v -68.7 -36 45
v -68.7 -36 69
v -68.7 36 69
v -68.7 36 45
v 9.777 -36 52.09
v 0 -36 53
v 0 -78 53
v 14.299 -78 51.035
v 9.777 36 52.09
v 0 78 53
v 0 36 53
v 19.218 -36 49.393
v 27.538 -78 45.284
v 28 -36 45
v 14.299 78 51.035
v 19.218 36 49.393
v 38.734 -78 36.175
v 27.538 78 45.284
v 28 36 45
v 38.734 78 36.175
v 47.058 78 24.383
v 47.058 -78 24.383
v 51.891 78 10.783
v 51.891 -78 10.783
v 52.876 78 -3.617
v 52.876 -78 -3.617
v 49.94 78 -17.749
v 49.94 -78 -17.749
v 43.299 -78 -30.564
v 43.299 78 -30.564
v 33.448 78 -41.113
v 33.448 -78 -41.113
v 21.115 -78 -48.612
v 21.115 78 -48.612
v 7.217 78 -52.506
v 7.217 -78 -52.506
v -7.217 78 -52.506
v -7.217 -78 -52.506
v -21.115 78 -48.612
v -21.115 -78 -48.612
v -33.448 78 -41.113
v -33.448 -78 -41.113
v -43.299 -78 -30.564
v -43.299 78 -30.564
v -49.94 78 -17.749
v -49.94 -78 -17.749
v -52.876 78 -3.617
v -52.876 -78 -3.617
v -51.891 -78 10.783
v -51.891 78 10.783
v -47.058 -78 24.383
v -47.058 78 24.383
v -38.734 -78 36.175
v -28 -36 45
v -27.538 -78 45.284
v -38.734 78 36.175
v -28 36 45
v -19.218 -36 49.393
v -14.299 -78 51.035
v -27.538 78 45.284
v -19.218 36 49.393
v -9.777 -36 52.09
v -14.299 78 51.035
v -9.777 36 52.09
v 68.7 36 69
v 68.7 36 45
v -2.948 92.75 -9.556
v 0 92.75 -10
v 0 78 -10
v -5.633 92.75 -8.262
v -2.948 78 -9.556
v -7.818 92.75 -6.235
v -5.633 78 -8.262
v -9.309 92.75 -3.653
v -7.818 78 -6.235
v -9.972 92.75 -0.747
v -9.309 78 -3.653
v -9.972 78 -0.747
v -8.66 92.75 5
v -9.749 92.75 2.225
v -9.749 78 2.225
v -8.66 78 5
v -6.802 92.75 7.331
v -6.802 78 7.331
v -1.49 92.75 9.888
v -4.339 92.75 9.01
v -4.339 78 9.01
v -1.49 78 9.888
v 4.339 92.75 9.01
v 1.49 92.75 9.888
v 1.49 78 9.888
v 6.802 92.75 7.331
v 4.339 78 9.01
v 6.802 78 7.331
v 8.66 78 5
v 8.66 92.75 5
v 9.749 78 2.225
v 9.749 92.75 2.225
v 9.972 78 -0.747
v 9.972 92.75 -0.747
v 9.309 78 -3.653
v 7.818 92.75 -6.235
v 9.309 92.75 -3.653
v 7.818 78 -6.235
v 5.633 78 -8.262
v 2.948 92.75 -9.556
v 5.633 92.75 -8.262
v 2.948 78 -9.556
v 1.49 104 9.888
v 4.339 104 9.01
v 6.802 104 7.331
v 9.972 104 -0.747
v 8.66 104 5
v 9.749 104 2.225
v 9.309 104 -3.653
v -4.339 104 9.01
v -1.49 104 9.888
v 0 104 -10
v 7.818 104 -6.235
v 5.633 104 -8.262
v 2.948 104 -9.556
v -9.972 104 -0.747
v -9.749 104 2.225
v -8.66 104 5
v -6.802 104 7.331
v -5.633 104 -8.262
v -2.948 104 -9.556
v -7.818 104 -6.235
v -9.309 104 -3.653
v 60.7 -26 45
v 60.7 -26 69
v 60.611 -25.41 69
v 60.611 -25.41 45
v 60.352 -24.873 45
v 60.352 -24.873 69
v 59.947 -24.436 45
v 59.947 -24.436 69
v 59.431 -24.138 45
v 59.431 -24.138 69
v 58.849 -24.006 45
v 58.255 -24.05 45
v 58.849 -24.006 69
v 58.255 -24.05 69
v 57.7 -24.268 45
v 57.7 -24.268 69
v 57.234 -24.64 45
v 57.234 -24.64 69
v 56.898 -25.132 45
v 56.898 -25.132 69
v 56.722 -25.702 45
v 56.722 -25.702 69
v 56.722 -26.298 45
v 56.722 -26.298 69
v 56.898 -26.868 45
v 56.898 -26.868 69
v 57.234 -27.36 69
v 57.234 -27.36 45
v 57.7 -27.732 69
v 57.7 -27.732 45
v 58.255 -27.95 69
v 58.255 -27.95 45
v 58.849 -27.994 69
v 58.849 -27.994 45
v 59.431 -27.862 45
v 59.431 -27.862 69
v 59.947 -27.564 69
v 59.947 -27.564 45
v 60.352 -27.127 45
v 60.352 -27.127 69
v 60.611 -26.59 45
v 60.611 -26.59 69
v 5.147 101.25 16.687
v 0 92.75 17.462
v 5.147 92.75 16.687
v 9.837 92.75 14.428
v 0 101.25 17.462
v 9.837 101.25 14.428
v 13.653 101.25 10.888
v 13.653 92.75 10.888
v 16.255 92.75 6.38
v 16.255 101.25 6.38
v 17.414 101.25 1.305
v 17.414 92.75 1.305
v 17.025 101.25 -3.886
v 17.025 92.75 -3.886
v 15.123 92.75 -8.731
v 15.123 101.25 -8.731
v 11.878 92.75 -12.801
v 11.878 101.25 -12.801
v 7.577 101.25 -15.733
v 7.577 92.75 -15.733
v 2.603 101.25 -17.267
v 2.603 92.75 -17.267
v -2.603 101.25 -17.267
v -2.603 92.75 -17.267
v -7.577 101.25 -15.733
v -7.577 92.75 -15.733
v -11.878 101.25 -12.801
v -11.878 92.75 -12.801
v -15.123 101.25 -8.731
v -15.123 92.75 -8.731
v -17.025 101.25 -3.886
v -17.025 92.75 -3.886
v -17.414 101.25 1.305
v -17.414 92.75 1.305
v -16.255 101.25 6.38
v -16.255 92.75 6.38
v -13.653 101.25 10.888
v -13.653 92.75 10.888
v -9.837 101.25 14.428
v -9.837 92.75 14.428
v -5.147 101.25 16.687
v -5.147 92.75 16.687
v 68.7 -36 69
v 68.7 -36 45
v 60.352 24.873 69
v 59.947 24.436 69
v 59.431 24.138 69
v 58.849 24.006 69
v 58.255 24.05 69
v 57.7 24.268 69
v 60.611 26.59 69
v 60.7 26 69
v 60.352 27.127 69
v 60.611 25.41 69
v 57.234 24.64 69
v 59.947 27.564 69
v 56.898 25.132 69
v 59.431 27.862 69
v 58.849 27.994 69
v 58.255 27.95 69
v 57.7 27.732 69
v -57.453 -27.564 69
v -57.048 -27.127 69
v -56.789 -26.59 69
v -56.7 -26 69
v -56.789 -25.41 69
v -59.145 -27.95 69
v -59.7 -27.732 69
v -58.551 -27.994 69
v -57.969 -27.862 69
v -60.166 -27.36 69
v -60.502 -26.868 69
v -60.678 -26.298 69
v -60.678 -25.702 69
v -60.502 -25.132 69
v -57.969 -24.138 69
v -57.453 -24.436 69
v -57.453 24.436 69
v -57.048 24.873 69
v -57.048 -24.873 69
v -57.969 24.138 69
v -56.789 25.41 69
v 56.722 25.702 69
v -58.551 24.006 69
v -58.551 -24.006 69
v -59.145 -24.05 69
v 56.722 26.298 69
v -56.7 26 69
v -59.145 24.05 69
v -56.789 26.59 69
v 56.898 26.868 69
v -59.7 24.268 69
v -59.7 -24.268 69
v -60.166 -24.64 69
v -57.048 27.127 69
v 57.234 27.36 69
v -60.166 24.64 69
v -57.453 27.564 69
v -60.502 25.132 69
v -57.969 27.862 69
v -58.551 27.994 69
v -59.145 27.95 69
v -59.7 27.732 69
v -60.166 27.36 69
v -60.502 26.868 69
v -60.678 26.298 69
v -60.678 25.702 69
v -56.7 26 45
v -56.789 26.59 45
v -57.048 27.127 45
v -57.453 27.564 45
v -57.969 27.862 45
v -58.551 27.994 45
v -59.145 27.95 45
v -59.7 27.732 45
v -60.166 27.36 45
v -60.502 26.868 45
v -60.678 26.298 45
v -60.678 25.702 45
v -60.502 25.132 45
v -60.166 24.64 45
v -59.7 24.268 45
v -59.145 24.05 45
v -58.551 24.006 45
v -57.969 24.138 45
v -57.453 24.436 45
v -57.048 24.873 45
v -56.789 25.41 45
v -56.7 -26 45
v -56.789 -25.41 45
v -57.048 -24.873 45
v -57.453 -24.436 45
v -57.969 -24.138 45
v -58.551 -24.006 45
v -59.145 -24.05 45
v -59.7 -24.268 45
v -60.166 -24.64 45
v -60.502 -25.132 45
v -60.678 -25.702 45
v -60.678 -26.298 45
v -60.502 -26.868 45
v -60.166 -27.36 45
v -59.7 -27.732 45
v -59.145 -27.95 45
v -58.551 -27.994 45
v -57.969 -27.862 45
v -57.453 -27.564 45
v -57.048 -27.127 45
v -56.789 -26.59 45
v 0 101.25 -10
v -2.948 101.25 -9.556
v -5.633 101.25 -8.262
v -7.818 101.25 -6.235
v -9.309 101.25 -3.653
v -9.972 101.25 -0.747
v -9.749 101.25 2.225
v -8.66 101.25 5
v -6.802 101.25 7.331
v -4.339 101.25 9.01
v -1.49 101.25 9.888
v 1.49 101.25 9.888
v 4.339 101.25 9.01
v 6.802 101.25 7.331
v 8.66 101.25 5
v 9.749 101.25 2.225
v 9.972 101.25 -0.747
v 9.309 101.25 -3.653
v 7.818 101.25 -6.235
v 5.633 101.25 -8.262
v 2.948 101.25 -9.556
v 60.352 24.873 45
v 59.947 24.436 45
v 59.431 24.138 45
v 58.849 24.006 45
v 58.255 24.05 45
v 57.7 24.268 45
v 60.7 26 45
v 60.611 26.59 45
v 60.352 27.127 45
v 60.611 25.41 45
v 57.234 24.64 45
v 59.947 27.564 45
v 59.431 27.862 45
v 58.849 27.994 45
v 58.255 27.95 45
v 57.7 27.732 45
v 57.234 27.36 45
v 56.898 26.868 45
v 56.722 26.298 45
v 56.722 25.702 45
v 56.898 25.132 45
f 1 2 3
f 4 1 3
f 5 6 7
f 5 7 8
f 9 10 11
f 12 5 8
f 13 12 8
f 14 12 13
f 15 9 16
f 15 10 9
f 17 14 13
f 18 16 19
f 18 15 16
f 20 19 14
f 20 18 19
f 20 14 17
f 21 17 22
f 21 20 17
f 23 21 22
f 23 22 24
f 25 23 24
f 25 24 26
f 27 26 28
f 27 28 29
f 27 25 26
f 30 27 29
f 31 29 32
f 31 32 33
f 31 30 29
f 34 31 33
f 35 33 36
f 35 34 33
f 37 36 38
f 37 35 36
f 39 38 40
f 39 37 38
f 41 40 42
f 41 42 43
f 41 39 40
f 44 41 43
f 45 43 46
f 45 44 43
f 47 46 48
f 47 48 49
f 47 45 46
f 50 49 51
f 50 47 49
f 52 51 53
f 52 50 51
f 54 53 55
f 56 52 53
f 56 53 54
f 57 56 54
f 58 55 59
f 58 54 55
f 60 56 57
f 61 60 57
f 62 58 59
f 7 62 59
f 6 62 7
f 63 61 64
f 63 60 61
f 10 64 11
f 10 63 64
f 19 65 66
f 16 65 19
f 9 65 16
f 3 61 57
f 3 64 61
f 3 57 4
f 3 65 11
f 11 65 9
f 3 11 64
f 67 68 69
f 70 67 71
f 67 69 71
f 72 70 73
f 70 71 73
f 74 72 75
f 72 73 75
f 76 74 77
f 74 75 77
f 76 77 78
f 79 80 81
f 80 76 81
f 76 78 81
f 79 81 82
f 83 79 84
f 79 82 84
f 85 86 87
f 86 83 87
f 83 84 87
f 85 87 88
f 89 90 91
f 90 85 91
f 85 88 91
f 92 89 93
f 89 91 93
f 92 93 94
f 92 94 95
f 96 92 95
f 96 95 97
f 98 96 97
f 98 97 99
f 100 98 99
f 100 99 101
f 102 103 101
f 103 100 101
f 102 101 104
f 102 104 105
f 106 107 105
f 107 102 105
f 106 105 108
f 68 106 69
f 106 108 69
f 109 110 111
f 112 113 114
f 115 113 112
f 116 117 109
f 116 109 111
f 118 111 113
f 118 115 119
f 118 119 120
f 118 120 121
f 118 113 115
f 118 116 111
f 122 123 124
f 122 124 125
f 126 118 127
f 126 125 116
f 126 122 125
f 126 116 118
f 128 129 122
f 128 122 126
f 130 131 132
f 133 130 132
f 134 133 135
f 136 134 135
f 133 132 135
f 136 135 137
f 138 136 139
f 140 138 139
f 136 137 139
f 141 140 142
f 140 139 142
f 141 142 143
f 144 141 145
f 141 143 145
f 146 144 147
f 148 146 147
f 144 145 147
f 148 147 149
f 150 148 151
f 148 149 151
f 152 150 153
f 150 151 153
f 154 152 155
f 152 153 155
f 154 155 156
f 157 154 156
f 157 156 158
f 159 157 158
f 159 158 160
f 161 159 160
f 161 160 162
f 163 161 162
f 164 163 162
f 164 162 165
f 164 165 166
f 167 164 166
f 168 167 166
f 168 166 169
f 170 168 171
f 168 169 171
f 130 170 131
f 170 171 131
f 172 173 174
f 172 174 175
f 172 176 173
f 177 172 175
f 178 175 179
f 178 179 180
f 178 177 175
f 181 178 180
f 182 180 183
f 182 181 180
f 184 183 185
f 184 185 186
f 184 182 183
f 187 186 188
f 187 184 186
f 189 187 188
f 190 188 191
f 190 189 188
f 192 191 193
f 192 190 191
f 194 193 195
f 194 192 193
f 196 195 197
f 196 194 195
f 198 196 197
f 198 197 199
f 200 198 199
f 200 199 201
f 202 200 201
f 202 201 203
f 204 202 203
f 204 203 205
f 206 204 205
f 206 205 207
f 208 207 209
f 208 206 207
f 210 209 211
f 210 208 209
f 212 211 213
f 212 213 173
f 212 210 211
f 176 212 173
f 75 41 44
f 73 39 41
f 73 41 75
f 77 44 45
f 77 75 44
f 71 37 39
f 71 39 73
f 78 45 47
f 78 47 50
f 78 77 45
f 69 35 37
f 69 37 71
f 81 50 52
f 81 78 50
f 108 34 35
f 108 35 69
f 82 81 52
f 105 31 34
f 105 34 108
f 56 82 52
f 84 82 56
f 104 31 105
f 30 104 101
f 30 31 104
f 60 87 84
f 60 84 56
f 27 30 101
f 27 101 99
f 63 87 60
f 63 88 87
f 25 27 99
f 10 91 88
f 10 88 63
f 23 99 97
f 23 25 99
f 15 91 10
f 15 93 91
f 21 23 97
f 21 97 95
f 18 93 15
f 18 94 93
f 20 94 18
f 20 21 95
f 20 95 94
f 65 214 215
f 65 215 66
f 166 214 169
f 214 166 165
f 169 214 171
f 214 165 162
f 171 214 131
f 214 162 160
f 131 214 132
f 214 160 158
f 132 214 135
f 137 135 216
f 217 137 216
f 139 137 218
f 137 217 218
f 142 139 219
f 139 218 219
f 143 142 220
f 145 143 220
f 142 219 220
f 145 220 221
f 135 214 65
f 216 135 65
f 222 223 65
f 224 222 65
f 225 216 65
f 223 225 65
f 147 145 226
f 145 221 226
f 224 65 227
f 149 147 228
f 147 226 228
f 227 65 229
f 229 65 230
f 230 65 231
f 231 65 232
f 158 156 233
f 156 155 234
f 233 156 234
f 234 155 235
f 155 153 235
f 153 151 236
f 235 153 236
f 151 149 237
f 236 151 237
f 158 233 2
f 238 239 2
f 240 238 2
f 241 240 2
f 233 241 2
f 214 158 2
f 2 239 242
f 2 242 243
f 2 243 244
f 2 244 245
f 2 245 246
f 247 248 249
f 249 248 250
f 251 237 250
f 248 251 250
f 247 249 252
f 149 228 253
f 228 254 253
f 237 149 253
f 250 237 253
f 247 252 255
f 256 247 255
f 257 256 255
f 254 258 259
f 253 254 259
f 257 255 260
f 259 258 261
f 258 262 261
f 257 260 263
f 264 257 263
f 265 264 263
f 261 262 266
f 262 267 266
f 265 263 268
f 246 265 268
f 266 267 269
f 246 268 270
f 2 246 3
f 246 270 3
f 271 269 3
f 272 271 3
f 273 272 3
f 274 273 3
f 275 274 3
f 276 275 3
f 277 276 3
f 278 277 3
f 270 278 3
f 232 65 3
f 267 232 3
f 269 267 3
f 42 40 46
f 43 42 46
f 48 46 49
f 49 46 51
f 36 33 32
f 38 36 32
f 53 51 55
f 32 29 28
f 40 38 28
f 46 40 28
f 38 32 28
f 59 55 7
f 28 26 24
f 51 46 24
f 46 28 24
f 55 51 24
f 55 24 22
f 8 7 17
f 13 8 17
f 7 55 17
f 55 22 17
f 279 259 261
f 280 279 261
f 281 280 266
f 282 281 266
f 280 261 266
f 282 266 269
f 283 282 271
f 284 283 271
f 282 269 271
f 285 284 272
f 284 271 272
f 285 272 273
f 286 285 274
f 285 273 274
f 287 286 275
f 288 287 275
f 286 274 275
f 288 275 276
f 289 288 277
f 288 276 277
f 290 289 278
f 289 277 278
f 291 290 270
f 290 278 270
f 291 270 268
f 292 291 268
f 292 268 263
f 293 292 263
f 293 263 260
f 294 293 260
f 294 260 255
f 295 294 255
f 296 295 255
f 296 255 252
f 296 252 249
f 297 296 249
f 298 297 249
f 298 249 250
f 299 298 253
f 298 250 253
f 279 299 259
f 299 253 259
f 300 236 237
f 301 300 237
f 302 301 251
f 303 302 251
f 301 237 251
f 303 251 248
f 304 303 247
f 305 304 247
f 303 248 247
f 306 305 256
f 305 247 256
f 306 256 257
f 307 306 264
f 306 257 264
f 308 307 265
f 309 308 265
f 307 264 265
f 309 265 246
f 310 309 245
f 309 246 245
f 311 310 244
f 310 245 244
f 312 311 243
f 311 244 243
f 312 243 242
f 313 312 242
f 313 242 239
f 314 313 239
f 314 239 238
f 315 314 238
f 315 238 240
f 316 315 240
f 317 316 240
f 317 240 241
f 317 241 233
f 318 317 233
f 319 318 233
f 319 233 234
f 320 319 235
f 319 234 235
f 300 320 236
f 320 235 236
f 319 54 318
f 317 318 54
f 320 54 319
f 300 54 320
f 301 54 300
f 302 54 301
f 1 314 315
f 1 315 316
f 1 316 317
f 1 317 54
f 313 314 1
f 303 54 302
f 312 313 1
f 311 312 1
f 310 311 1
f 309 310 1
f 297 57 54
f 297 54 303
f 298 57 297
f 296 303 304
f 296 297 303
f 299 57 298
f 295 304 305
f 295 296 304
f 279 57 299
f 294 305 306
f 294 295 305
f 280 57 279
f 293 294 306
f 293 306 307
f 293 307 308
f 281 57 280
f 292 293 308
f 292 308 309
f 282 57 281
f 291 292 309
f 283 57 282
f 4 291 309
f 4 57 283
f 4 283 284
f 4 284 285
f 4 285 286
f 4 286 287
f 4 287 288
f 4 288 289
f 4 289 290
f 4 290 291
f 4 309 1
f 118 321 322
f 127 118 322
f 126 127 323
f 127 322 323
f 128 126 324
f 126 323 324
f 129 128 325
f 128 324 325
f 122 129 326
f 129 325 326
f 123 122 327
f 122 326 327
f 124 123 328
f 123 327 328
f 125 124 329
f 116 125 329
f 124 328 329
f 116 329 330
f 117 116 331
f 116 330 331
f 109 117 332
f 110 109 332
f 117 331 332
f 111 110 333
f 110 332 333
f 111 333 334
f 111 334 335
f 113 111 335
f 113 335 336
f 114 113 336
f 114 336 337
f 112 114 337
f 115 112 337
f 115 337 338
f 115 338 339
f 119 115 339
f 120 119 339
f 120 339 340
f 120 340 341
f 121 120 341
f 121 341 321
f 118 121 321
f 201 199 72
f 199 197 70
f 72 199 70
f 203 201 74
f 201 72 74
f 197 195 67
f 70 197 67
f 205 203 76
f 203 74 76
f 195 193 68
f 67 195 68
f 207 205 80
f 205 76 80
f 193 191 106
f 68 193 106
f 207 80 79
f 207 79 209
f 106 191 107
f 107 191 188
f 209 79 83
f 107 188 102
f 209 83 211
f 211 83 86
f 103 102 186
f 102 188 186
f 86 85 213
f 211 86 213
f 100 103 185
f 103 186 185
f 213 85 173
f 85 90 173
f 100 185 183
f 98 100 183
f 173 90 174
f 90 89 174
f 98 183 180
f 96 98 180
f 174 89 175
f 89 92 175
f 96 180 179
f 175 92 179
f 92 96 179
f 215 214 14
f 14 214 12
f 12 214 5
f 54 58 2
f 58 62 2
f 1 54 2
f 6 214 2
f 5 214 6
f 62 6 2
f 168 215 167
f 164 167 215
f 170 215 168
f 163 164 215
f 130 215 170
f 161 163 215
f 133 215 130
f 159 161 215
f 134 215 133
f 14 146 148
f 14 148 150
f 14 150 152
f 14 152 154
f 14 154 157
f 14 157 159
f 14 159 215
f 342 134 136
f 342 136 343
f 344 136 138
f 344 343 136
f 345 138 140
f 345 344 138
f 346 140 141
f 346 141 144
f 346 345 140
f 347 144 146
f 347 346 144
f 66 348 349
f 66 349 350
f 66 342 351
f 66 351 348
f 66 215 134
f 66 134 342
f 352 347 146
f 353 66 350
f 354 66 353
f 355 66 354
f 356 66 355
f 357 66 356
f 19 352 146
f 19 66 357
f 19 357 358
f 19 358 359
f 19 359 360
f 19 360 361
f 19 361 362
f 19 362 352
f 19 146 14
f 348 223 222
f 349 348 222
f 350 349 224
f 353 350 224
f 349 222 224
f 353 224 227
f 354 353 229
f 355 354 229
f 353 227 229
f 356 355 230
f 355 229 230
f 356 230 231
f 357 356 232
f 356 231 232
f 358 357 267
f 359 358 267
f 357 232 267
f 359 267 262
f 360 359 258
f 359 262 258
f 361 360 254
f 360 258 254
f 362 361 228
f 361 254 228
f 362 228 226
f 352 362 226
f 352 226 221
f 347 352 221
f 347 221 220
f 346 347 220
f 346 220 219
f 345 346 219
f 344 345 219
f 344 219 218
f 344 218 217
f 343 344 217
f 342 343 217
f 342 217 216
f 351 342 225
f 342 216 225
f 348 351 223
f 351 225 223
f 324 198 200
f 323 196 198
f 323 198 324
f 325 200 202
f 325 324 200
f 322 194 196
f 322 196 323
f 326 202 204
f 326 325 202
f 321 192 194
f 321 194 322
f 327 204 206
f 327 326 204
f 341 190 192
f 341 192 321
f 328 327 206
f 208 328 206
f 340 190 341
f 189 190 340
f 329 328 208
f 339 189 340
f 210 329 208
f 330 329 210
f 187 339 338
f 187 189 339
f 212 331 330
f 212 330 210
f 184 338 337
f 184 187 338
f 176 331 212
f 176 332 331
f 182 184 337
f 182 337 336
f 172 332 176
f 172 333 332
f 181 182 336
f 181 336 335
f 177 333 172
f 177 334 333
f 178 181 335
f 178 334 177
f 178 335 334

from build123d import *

# Parameters (mm, degrees)
SKETCH1_R           = 53
BOSS_EXTRUDE1_DEPTH = 78
SKETCH2_R           = 10
BOSS_EXTRUDE2_DEPTH = 26
SKETCH9_R           = 17.4625
BOSS_EXTRUDE4_DEPTH = 4.25
SKETCH12_W          = 137.4
SKETCH12_H          = 72
BOSS_EXTRUDE6_DEPTH = 24
SKETCH13_R          = 2
CUT_EXTRUDE2_DEPTH  = 24


with BuildPart() as part:
    # Sketch1 → Boss-Extrude1 (new, symmetric)
    with BuildSketch(Plane(origin=(0, 0, 0), x_dir=(1, 0, 0), z_dir=(0, 1, 0))):
        with Locations(Location((0, 0, 0), (0, 0, 270))):
            Circle(SKETCH1_R)
    extrude(amount=BOSS_EXTRUDE1_DEPTH, both=True)

    # Sketch2 → Boss-Extrude2 (add)
    with BuildSketch(Plane(origin=(0, 78, 0), x_dir=(1, 0, 0), z_dir=(0, 1, 0))):
        with Locations(Location((0, 0, 0), (0, 0, 90))):
            Circle(SKETCH2_R)
    extrude(amount=BOSS_EXTRUDE2_DEPTH)

    # Sketch9 → Boss-Extrude4 (add, symmetric)
    with BuildSketch(Plane(origin=(0, 97, 0), x_dir=(1, 0, 0), z_dir=(0, 1, 0))):
        with Locations(Location((0, 0, 0), (0, 0, 270))):
            Circle(SKETCH9_R)
    extrude(amount=BOSS_EXTRUDE4_DEPTH, both=True)

    # Sketch12 → Boss-Extrude6 (add)
    with BuildSketch(Plane(origin=(0, 0, 69), x_dir=(-1, 0, 0), z_dir=(0, 0, -1))):
        Rectangle(SKETCH12_W, SKETCH12_H)
    extrude(amount=BOSS_EXTRUDE6_DEPTH)

    # Sketch13 → Cut-Extrude2 (cut)
    with BuildSketch(Plane.XY.offset(69)):
        with Locations((-58.7, -26)):
            Circle(SKETCH13_R)
        with Locations((-58.7, 26)):
            Circle(SKETCH13_R)
        with Locations((58.7, 26)):
            Circle(SKETCH13_R)
        with Locations((58.7, -26)):
            Circle(SKETCH13_R)
    extrude(amount=-CUT_EXTRUDE2_DEPTH, mode=Mode.SUBTRACT)


solid = part.part
